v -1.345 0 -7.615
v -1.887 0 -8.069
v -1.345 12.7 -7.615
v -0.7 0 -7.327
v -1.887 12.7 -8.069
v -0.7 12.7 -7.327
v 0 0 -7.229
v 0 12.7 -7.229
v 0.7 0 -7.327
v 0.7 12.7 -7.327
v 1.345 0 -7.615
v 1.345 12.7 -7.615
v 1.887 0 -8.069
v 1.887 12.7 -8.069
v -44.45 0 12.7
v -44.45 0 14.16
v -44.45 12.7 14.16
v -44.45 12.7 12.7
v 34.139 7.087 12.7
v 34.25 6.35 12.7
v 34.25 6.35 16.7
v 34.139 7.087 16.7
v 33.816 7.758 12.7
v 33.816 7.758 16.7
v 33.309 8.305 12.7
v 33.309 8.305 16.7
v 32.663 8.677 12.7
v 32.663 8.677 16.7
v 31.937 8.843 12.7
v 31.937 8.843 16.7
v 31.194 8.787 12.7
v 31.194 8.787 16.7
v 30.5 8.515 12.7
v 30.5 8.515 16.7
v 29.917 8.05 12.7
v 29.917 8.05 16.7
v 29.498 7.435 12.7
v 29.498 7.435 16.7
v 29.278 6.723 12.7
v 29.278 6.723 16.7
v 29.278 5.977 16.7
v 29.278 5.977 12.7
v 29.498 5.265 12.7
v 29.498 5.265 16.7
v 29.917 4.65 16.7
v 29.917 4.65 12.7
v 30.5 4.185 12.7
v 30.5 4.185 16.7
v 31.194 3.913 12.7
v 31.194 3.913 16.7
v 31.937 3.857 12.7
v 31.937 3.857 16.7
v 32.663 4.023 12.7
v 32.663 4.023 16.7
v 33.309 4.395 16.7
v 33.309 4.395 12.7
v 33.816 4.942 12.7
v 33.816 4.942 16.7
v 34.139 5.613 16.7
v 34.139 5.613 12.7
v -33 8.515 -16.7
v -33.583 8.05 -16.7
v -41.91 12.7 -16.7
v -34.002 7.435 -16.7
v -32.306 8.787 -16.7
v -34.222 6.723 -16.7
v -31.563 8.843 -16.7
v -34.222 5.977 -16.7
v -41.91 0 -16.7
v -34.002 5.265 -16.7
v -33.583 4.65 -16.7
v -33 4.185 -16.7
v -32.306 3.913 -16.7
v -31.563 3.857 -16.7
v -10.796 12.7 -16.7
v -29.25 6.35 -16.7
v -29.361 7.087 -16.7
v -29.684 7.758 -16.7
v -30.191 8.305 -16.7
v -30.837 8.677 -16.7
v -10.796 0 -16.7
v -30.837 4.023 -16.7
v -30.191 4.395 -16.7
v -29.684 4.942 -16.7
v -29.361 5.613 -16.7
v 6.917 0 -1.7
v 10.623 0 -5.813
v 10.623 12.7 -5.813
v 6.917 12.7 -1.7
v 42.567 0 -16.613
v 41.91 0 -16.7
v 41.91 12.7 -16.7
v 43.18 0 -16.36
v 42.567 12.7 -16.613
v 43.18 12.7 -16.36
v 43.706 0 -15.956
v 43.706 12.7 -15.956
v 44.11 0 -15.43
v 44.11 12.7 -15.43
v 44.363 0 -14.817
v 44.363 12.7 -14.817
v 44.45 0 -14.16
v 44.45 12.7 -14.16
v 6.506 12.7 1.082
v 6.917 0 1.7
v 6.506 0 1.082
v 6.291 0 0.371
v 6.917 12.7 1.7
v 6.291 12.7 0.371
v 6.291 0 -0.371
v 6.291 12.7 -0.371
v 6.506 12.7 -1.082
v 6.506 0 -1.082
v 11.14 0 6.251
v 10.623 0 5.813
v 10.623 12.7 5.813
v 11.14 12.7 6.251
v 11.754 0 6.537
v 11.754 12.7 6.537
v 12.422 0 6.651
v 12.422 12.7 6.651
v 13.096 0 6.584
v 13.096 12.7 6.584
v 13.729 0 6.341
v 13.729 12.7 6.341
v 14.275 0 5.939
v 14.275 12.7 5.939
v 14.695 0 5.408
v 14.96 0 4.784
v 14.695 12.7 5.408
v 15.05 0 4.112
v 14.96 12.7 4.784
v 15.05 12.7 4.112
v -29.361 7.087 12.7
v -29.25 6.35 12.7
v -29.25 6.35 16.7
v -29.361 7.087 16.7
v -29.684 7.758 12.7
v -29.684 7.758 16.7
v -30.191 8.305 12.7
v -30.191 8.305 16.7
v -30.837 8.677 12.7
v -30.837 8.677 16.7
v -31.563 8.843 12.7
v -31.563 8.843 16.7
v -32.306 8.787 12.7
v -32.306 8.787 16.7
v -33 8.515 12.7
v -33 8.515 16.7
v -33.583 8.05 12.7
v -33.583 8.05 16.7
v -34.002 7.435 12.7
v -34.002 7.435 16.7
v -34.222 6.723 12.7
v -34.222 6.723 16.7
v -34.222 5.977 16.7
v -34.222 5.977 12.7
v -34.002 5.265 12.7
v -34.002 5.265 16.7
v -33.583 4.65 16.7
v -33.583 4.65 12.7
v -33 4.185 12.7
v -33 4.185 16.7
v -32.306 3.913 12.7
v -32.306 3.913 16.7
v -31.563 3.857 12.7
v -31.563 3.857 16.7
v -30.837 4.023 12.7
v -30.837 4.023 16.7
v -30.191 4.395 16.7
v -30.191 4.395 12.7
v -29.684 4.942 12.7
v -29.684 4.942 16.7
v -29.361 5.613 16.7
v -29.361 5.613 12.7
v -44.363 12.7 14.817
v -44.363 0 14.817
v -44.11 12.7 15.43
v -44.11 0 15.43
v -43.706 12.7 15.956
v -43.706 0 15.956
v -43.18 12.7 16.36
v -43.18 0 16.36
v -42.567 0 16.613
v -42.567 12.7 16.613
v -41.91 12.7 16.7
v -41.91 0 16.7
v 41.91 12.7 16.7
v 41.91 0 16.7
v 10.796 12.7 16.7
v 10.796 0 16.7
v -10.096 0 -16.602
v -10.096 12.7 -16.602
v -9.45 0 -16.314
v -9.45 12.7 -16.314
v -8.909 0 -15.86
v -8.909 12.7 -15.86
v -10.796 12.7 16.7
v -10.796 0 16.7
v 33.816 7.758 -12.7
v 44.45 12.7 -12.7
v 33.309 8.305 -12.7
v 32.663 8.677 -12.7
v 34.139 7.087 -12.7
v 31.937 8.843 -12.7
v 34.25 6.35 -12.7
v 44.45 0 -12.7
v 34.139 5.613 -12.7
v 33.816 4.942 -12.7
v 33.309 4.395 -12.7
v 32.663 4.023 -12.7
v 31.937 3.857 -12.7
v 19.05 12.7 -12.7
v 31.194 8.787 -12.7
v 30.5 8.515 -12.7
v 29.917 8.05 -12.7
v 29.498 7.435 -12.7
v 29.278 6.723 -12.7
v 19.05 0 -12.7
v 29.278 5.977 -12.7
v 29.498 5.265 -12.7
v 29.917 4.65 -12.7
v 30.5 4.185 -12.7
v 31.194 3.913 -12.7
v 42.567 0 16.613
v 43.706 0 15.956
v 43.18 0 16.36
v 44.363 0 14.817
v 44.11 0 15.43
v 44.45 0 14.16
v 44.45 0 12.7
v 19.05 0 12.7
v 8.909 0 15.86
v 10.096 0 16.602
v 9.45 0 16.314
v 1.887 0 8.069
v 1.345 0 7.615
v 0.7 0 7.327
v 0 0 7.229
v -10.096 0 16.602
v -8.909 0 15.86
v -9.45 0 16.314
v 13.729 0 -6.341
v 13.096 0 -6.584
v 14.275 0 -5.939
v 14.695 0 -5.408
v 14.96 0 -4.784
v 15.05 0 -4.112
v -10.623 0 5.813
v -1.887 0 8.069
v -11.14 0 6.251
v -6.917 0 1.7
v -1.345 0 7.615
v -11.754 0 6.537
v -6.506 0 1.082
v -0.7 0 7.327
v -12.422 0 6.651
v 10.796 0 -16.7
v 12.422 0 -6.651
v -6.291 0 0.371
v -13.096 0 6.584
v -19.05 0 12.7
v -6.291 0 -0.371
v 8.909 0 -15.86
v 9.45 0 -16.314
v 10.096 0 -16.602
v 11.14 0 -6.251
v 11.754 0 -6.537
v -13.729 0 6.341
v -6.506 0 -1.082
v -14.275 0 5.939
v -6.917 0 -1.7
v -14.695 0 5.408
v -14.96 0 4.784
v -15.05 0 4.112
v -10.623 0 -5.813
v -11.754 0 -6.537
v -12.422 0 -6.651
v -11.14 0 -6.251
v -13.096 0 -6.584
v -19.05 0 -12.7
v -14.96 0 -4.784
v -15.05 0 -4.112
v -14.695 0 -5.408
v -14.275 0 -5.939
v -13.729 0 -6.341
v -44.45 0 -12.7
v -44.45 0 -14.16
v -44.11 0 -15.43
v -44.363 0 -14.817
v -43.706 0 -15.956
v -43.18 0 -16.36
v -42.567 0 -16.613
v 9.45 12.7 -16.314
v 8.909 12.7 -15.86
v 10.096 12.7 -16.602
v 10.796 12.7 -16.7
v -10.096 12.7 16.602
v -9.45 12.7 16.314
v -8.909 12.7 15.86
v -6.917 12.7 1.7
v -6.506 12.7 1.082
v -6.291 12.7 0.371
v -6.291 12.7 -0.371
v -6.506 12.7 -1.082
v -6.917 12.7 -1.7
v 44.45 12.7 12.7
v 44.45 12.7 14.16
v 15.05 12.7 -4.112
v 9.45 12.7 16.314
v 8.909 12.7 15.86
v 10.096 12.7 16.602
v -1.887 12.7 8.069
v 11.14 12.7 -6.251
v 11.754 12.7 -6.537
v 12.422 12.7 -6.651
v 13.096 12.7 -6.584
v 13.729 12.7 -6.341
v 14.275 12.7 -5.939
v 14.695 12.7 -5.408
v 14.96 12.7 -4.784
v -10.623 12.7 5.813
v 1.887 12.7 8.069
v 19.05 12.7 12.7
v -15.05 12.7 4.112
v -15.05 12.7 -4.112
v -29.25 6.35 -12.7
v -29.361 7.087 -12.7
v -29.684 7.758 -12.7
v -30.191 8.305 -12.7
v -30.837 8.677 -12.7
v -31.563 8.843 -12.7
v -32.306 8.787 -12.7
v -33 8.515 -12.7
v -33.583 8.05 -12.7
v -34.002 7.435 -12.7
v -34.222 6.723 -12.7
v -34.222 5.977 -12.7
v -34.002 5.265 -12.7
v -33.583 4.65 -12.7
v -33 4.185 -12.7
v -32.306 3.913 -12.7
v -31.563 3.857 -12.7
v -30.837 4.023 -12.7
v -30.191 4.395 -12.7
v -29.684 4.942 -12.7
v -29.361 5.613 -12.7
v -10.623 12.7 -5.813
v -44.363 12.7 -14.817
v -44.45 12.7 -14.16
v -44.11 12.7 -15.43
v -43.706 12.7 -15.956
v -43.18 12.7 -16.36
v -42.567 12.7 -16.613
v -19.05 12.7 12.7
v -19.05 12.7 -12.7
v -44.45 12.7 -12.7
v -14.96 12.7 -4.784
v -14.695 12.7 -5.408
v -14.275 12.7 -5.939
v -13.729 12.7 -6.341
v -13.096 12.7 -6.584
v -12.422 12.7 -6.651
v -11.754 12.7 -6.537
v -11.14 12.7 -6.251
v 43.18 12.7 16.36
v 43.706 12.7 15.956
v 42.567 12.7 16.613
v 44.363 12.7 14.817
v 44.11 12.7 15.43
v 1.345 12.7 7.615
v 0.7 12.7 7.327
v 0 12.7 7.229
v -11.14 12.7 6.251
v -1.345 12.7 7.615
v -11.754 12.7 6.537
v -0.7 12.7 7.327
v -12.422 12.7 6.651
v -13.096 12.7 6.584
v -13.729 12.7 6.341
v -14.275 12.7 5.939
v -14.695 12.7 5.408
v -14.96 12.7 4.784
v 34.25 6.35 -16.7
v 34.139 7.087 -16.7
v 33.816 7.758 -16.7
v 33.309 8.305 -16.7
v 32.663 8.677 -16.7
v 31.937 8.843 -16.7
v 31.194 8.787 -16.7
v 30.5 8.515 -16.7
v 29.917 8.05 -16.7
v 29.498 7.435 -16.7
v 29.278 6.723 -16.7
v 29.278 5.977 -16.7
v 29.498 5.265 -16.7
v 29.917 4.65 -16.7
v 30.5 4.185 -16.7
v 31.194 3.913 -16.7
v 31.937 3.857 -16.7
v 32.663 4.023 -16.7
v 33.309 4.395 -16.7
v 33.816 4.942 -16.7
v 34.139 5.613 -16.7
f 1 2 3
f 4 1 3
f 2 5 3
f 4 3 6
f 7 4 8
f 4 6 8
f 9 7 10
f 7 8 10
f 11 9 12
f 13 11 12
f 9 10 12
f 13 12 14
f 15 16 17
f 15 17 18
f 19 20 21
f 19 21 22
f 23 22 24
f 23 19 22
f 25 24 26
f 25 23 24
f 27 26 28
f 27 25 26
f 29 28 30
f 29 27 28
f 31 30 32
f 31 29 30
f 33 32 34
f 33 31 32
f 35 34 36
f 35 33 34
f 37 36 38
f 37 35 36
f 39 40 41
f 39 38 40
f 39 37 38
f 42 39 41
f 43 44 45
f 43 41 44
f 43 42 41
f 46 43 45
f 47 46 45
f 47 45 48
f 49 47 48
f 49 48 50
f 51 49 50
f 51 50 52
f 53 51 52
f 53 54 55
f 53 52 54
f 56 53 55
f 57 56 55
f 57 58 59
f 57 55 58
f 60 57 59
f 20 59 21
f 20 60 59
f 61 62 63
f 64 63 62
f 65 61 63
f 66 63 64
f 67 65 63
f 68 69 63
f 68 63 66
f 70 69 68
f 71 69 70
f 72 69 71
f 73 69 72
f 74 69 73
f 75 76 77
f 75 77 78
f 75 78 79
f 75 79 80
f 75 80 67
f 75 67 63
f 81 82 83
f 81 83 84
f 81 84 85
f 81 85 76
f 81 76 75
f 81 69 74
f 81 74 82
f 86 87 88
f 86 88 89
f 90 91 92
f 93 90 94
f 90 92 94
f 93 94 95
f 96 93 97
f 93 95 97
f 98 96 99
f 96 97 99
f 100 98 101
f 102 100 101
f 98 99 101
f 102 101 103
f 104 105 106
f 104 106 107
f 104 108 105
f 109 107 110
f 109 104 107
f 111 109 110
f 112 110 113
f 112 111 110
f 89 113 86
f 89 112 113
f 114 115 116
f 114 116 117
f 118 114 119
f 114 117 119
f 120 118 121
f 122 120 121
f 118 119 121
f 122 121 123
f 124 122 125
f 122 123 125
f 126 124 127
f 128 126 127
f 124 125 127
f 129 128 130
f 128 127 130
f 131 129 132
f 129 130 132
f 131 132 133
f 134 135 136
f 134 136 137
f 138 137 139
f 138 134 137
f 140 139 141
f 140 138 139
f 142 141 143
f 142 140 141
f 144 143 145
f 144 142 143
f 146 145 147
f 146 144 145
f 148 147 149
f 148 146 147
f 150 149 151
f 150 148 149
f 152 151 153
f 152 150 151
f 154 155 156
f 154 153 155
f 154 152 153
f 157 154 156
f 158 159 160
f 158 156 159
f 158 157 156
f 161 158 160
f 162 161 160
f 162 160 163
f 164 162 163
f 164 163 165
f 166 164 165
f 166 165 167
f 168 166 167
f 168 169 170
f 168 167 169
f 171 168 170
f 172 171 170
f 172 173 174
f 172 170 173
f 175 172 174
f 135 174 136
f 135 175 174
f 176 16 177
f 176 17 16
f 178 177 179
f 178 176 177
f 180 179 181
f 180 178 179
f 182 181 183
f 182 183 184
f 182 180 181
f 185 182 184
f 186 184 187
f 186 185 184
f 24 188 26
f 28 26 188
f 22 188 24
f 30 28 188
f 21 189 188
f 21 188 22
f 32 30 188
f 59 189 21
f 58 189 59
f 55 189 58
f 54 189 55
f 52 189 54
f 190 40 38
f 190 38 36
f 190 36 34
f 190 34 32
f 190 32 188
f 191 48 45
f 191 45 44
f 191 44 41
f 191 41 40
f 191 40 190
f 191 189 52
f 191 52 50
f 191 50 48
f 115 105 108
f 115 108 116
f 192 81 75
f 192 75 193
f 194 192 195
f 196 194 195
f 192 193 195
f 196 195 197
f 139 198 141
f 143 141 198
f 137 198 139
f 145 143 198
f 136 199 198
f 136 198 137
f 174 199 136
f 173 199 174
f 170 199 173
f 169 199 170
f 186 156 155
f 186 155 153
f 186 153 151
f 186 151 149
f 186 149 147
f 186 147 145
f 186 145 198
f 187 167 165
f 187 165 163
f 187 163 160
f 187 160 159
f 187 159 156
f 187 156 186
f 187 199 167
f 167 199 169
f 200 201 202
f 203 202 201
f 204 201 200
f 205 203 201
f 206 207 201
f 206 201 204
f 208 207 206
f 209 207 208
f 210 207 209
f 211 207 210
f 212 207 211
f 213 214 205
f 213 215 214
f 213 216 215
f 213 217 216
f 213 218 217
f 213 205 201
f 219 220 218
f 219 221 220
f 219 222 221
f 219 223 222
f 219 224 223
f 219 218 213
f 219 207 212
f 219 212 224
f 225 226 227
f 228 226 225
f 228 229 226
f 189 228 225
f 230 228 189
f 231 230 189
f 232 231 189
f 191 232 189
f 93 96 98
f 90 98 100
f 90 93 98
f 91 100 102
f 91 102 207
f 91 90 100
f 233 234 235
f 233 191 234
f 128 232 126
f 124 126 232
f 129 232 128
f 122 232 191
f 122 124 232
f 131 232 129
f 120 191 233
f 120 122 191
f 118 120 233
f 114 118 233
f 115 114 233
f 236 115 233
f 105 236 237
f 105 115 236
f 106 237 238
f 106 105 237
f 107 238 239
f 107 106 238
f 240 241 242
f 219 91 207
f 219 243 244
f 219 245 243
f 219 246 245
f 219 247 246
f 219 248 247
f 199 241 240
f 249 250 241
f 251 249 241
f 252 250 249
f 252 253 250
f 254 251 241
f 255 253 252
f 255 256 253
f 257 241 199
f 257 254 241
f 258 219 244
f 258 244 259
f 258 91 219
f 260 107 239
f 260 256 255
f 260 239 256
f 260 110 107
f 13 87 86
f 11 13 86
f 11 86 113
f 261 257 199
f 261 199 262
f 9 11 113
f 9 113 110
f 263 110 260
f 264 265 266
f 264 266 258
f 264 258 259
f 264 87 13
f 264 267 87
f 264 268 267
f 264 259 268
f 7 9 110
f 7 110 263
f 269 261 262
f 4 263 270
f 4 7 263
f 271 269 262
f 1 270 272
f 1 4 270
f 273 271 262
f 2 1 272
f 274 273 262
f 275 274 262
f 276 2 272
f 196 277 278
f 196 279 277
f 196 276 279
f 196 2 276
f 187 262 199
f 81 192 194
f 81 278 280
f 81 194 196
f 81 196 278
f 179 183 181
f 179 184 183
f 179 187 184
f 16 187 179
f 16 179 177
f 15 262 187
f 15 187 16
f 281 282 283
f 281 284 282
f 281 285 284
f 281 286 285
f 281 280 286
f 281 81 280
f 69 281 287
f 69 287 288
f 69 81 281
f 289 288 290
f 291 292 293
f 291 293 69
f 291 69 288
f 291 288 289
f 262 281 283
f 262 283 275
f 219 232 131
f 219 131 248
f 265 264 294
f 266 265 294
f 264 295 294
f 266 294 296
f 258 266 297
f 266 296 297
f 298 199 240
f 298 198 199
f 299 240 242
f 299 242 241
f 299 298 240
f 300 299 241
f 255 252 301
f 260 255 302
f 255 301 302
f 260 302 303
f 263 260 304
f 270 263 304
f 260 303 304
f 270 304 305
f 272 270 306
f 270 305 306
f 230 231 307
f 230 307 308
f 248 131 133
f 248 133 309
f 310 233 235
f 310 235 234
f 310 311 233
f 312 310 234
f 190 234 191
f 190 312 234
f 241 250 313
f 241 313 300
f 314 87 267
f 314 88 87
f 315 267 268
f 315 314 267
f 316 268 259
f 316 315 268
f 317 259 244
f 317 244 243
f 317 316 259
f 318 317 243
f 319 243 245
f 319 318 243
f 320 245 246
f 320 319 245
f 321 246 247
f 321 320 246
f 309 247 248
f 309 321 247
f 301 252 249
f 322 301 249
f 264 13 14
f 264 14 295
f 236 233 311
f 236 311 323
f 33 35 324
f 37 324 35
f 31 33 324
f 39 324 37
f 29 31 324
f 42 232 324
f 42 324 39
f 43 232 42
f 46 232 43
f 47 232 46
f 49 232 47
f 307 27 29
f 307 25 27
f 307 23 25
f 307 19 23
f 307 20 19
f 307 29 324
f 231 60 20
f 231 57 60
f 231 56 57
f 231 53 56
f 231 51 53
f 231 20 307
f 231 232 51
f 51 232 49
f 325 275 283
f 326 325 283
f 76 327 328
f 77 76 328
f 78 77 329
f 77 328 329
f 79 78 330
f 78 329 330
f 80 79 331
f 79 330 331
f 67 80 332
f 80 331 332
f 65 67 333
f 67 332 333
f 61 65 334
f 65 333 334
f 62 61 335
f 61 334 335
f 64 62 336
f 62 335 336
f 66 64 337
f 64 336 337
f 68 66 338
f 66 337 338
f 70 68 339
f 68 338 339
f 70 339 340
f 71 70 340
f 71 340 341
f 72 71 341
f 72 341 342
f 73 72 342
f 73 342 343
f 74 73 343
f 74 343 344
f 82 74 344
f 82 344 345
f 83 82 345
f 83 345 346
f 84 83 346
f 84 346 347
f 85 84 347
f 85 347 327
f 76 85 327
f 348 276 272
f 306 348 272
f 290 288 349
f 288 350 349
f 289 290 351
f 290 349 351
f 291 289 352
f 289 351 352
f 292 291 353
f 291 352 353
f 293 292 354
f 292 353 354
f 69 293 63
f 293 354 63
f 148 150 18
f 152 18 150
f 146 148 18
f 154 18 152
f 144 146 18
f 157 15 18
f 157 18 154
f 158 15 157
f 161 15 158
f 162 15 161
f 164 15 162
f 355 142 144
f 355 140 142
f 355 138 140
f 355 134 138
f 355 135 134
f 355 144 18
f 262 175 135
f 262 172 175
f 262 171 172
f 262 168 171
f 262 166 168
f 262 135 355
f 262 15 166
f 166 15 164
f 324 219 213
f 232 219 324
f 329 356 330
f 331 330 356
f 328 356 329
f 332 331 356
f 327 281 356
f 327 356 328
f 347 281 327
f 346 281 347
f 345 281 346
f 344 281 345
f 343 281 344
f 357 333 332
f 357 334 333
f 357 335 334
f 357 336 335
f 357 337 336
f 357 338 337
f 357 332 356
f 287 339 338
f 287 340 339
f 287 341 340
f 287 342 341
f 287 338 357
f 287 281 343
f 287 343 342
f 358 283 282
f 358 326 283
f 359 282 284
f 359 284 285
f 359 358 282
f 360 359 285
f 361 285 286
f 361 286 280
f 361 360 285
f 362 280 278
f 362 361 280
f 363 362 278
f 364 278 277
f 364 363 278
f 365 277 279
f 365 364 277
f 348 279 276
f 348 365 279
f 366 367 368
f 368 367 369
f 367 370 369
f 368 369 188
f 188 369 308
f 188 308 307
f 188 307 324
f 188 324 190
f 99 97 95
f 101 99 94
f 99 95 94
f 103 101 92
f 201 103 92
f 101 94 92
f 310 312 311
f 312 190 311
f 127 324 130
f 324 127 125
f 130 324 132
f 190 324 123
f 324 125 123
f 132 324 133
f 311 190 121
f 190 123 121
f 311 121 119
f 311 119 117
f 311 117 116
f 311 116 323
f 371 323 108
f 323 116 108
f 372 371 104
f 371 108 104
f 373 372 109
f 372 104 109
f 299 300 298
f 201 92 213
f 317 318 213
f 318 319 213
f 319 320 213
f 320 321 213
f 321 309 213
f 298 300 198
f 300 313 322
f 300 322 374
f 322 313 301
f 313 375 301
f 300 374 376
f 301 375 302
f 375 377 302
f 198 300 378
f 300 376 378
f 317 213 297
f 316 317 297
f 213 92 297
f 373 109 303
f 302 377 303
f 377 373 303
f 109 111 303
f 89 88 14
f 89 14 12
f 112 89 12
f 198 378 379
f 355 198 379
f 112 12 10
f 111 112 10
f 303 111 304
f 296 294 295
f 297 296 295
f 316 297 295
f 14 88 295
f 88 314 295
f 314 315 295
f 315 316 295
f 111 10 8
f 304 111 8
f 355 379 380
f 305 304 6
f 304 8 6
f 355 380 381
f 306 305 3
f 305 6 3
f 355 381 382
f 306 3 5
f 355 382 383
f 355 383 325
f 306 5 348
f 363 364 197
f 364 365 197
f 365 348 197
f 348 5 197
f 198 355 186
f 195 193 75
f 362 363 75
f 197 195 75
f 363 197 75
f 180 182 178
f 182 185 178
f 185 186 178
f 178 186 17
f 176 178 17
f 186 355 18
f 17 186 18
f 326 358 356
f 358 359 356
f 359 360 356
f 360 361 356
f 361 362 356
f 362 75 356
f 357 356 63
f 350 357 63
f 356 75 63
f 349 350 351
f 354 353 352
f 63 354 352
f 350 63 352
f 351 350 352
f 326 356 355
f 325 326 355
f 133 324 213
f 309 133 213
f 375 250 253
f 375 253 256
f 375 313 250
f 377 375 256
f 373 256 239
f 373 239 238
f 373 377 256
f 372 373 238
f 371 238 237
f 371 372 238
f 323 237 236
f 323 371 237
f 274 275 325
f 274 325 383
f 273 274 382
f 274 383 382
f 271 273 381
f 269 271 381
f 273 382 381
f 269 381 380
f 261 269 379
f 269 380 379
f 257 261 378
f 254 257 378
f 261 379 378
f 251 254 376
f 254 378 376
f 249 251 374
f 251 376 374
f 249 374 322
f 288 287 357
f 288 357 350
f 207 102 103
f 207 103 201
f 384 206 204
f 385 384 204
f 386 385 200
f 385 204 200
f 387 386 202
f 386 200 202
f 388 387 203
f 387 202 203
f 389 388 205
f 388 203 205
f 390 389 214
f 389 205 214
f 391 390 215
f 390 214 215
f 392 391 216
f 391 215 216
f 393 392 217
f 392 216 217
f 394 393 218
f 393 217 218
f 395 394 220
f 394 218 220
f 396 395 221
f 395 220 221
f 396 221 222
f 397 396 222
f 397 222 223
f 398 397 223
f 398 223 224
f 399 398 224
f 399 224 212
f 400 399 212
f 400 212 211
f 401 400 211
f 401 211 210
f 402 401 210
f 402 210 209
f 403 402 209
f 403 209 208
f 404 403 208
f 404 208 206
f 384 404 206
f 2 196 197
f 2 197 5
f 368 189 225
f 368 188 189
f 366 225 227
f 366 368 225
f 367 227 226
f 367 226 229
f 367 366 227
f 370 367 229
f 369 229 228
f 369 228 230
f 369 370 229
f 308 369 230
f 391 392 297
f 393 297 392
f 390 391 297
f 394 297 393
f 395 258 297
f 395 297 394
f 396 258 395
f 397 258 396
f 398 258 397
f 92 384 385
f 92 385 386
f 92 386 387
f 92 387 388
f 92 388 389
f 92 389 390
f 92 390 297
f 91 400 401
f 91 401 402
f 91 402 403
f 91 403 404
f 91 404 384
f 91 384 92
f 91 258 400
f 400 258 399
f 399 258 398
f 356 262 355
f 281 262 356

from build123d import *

# Parameters (mm, degrees)
BOSS_EXTRUDE1_DEPTH     = 12.7
FILLET1_R               = 2.54
SKETCH3_R               = 2.5
CUT_EXTRUDE1_DEPTH      = 30.4
CUT_EXTRUDE1_DEPTH_BACK = 5


with BuildPart() as part:
    # Sketch1 → Boss-Extrude1 (new body)
    with BuildSketch(Plane(origin=(0, 0, 0), x_dir=(1, 0, 0), z_dir=(0, 1, 0))):
        Polygon((-19.05, -12.7), (-19.05, 12.7), (-44.45, 12.7), (-44.45, 16.7), (-9.665344582, 16.7), (0, 5.974999699), (9.665344582, 16.7), (44.45, 16.7), (44.45, 12.7), (19.05, 12.7), (19.05, -12.7), (44.45, -12.7), (44.45, -16.7), (9.665344582, -16.7), (0, -5.974999699), (-9.665344582, -16.7), (-44.45, -16.7), (-44.45, -12.7), align=None)
        Polygon((-15.05, -10.725000301), (-15.05, 10.725000301), (-5.384655418, 0), align=None, mode=Mode.SUBTRACT)
        Polygon((15.05, -10.725000301), (15.05, 10.725000301), (5.384655418, 0), align=None, mode=Mode.SUBTRACT)
    extrude(amount=BOSS_EXTRUDE1_DEPTH)

    # Fillet1
    fillet1_edges = [part.edges().sort_by_distance(p)[0] for p in [
        (-44.45, 6.35, -16.7),
        (-9.665344582, 6.35, -16.7),
        (0, 6.35, -5.974999699),
        (9.665344582, 6.35, -16.7),
        (44.45, 6.35, -16.7),
        (44.45, 6.35, 16.7),
        (9.665344582, 6.35, 16.7),
        (0, 6.35, 5.974999699),
        (-9.665344582, 6.35, 16.7),
        (-44.45, 6.35, 16.7),
        (-15.05, 6.35, 10.725000301),
        (-5.384655418, 6.35, 0),
        (-15.05, 6.35, -10.725000301),
        (5.384655418, 6.35, 0),
        (15.05, 6.35, 10.725000301),
        (15.05, 6.35, -10.725000301),
    ]]
    fillet(fillet1_edges, radius=FILLET1_R)

    # Sketch3 → Cut-Extrude1 (cut, two sides)
    with BuildSketch(Plane.XY.offset(-12.7)) as cut_extrude1_sk:
        with Locations((-31.75, 6.35)):
            Circle(SKETCH3_R)
        with Locations((31.75, 6.35)):
            Circle(SKETCH3_R)
    extrude(amount=CUT_EXTRUDE1_DEPTH, mode=Mode.SUBTRACT)
    extrude(cut_extrude1_sk.sketch, amount=-CUT_EXTRUDE1_DEPTH_BACK, mode=Mode.SUBTRACT)


solid = part.part
